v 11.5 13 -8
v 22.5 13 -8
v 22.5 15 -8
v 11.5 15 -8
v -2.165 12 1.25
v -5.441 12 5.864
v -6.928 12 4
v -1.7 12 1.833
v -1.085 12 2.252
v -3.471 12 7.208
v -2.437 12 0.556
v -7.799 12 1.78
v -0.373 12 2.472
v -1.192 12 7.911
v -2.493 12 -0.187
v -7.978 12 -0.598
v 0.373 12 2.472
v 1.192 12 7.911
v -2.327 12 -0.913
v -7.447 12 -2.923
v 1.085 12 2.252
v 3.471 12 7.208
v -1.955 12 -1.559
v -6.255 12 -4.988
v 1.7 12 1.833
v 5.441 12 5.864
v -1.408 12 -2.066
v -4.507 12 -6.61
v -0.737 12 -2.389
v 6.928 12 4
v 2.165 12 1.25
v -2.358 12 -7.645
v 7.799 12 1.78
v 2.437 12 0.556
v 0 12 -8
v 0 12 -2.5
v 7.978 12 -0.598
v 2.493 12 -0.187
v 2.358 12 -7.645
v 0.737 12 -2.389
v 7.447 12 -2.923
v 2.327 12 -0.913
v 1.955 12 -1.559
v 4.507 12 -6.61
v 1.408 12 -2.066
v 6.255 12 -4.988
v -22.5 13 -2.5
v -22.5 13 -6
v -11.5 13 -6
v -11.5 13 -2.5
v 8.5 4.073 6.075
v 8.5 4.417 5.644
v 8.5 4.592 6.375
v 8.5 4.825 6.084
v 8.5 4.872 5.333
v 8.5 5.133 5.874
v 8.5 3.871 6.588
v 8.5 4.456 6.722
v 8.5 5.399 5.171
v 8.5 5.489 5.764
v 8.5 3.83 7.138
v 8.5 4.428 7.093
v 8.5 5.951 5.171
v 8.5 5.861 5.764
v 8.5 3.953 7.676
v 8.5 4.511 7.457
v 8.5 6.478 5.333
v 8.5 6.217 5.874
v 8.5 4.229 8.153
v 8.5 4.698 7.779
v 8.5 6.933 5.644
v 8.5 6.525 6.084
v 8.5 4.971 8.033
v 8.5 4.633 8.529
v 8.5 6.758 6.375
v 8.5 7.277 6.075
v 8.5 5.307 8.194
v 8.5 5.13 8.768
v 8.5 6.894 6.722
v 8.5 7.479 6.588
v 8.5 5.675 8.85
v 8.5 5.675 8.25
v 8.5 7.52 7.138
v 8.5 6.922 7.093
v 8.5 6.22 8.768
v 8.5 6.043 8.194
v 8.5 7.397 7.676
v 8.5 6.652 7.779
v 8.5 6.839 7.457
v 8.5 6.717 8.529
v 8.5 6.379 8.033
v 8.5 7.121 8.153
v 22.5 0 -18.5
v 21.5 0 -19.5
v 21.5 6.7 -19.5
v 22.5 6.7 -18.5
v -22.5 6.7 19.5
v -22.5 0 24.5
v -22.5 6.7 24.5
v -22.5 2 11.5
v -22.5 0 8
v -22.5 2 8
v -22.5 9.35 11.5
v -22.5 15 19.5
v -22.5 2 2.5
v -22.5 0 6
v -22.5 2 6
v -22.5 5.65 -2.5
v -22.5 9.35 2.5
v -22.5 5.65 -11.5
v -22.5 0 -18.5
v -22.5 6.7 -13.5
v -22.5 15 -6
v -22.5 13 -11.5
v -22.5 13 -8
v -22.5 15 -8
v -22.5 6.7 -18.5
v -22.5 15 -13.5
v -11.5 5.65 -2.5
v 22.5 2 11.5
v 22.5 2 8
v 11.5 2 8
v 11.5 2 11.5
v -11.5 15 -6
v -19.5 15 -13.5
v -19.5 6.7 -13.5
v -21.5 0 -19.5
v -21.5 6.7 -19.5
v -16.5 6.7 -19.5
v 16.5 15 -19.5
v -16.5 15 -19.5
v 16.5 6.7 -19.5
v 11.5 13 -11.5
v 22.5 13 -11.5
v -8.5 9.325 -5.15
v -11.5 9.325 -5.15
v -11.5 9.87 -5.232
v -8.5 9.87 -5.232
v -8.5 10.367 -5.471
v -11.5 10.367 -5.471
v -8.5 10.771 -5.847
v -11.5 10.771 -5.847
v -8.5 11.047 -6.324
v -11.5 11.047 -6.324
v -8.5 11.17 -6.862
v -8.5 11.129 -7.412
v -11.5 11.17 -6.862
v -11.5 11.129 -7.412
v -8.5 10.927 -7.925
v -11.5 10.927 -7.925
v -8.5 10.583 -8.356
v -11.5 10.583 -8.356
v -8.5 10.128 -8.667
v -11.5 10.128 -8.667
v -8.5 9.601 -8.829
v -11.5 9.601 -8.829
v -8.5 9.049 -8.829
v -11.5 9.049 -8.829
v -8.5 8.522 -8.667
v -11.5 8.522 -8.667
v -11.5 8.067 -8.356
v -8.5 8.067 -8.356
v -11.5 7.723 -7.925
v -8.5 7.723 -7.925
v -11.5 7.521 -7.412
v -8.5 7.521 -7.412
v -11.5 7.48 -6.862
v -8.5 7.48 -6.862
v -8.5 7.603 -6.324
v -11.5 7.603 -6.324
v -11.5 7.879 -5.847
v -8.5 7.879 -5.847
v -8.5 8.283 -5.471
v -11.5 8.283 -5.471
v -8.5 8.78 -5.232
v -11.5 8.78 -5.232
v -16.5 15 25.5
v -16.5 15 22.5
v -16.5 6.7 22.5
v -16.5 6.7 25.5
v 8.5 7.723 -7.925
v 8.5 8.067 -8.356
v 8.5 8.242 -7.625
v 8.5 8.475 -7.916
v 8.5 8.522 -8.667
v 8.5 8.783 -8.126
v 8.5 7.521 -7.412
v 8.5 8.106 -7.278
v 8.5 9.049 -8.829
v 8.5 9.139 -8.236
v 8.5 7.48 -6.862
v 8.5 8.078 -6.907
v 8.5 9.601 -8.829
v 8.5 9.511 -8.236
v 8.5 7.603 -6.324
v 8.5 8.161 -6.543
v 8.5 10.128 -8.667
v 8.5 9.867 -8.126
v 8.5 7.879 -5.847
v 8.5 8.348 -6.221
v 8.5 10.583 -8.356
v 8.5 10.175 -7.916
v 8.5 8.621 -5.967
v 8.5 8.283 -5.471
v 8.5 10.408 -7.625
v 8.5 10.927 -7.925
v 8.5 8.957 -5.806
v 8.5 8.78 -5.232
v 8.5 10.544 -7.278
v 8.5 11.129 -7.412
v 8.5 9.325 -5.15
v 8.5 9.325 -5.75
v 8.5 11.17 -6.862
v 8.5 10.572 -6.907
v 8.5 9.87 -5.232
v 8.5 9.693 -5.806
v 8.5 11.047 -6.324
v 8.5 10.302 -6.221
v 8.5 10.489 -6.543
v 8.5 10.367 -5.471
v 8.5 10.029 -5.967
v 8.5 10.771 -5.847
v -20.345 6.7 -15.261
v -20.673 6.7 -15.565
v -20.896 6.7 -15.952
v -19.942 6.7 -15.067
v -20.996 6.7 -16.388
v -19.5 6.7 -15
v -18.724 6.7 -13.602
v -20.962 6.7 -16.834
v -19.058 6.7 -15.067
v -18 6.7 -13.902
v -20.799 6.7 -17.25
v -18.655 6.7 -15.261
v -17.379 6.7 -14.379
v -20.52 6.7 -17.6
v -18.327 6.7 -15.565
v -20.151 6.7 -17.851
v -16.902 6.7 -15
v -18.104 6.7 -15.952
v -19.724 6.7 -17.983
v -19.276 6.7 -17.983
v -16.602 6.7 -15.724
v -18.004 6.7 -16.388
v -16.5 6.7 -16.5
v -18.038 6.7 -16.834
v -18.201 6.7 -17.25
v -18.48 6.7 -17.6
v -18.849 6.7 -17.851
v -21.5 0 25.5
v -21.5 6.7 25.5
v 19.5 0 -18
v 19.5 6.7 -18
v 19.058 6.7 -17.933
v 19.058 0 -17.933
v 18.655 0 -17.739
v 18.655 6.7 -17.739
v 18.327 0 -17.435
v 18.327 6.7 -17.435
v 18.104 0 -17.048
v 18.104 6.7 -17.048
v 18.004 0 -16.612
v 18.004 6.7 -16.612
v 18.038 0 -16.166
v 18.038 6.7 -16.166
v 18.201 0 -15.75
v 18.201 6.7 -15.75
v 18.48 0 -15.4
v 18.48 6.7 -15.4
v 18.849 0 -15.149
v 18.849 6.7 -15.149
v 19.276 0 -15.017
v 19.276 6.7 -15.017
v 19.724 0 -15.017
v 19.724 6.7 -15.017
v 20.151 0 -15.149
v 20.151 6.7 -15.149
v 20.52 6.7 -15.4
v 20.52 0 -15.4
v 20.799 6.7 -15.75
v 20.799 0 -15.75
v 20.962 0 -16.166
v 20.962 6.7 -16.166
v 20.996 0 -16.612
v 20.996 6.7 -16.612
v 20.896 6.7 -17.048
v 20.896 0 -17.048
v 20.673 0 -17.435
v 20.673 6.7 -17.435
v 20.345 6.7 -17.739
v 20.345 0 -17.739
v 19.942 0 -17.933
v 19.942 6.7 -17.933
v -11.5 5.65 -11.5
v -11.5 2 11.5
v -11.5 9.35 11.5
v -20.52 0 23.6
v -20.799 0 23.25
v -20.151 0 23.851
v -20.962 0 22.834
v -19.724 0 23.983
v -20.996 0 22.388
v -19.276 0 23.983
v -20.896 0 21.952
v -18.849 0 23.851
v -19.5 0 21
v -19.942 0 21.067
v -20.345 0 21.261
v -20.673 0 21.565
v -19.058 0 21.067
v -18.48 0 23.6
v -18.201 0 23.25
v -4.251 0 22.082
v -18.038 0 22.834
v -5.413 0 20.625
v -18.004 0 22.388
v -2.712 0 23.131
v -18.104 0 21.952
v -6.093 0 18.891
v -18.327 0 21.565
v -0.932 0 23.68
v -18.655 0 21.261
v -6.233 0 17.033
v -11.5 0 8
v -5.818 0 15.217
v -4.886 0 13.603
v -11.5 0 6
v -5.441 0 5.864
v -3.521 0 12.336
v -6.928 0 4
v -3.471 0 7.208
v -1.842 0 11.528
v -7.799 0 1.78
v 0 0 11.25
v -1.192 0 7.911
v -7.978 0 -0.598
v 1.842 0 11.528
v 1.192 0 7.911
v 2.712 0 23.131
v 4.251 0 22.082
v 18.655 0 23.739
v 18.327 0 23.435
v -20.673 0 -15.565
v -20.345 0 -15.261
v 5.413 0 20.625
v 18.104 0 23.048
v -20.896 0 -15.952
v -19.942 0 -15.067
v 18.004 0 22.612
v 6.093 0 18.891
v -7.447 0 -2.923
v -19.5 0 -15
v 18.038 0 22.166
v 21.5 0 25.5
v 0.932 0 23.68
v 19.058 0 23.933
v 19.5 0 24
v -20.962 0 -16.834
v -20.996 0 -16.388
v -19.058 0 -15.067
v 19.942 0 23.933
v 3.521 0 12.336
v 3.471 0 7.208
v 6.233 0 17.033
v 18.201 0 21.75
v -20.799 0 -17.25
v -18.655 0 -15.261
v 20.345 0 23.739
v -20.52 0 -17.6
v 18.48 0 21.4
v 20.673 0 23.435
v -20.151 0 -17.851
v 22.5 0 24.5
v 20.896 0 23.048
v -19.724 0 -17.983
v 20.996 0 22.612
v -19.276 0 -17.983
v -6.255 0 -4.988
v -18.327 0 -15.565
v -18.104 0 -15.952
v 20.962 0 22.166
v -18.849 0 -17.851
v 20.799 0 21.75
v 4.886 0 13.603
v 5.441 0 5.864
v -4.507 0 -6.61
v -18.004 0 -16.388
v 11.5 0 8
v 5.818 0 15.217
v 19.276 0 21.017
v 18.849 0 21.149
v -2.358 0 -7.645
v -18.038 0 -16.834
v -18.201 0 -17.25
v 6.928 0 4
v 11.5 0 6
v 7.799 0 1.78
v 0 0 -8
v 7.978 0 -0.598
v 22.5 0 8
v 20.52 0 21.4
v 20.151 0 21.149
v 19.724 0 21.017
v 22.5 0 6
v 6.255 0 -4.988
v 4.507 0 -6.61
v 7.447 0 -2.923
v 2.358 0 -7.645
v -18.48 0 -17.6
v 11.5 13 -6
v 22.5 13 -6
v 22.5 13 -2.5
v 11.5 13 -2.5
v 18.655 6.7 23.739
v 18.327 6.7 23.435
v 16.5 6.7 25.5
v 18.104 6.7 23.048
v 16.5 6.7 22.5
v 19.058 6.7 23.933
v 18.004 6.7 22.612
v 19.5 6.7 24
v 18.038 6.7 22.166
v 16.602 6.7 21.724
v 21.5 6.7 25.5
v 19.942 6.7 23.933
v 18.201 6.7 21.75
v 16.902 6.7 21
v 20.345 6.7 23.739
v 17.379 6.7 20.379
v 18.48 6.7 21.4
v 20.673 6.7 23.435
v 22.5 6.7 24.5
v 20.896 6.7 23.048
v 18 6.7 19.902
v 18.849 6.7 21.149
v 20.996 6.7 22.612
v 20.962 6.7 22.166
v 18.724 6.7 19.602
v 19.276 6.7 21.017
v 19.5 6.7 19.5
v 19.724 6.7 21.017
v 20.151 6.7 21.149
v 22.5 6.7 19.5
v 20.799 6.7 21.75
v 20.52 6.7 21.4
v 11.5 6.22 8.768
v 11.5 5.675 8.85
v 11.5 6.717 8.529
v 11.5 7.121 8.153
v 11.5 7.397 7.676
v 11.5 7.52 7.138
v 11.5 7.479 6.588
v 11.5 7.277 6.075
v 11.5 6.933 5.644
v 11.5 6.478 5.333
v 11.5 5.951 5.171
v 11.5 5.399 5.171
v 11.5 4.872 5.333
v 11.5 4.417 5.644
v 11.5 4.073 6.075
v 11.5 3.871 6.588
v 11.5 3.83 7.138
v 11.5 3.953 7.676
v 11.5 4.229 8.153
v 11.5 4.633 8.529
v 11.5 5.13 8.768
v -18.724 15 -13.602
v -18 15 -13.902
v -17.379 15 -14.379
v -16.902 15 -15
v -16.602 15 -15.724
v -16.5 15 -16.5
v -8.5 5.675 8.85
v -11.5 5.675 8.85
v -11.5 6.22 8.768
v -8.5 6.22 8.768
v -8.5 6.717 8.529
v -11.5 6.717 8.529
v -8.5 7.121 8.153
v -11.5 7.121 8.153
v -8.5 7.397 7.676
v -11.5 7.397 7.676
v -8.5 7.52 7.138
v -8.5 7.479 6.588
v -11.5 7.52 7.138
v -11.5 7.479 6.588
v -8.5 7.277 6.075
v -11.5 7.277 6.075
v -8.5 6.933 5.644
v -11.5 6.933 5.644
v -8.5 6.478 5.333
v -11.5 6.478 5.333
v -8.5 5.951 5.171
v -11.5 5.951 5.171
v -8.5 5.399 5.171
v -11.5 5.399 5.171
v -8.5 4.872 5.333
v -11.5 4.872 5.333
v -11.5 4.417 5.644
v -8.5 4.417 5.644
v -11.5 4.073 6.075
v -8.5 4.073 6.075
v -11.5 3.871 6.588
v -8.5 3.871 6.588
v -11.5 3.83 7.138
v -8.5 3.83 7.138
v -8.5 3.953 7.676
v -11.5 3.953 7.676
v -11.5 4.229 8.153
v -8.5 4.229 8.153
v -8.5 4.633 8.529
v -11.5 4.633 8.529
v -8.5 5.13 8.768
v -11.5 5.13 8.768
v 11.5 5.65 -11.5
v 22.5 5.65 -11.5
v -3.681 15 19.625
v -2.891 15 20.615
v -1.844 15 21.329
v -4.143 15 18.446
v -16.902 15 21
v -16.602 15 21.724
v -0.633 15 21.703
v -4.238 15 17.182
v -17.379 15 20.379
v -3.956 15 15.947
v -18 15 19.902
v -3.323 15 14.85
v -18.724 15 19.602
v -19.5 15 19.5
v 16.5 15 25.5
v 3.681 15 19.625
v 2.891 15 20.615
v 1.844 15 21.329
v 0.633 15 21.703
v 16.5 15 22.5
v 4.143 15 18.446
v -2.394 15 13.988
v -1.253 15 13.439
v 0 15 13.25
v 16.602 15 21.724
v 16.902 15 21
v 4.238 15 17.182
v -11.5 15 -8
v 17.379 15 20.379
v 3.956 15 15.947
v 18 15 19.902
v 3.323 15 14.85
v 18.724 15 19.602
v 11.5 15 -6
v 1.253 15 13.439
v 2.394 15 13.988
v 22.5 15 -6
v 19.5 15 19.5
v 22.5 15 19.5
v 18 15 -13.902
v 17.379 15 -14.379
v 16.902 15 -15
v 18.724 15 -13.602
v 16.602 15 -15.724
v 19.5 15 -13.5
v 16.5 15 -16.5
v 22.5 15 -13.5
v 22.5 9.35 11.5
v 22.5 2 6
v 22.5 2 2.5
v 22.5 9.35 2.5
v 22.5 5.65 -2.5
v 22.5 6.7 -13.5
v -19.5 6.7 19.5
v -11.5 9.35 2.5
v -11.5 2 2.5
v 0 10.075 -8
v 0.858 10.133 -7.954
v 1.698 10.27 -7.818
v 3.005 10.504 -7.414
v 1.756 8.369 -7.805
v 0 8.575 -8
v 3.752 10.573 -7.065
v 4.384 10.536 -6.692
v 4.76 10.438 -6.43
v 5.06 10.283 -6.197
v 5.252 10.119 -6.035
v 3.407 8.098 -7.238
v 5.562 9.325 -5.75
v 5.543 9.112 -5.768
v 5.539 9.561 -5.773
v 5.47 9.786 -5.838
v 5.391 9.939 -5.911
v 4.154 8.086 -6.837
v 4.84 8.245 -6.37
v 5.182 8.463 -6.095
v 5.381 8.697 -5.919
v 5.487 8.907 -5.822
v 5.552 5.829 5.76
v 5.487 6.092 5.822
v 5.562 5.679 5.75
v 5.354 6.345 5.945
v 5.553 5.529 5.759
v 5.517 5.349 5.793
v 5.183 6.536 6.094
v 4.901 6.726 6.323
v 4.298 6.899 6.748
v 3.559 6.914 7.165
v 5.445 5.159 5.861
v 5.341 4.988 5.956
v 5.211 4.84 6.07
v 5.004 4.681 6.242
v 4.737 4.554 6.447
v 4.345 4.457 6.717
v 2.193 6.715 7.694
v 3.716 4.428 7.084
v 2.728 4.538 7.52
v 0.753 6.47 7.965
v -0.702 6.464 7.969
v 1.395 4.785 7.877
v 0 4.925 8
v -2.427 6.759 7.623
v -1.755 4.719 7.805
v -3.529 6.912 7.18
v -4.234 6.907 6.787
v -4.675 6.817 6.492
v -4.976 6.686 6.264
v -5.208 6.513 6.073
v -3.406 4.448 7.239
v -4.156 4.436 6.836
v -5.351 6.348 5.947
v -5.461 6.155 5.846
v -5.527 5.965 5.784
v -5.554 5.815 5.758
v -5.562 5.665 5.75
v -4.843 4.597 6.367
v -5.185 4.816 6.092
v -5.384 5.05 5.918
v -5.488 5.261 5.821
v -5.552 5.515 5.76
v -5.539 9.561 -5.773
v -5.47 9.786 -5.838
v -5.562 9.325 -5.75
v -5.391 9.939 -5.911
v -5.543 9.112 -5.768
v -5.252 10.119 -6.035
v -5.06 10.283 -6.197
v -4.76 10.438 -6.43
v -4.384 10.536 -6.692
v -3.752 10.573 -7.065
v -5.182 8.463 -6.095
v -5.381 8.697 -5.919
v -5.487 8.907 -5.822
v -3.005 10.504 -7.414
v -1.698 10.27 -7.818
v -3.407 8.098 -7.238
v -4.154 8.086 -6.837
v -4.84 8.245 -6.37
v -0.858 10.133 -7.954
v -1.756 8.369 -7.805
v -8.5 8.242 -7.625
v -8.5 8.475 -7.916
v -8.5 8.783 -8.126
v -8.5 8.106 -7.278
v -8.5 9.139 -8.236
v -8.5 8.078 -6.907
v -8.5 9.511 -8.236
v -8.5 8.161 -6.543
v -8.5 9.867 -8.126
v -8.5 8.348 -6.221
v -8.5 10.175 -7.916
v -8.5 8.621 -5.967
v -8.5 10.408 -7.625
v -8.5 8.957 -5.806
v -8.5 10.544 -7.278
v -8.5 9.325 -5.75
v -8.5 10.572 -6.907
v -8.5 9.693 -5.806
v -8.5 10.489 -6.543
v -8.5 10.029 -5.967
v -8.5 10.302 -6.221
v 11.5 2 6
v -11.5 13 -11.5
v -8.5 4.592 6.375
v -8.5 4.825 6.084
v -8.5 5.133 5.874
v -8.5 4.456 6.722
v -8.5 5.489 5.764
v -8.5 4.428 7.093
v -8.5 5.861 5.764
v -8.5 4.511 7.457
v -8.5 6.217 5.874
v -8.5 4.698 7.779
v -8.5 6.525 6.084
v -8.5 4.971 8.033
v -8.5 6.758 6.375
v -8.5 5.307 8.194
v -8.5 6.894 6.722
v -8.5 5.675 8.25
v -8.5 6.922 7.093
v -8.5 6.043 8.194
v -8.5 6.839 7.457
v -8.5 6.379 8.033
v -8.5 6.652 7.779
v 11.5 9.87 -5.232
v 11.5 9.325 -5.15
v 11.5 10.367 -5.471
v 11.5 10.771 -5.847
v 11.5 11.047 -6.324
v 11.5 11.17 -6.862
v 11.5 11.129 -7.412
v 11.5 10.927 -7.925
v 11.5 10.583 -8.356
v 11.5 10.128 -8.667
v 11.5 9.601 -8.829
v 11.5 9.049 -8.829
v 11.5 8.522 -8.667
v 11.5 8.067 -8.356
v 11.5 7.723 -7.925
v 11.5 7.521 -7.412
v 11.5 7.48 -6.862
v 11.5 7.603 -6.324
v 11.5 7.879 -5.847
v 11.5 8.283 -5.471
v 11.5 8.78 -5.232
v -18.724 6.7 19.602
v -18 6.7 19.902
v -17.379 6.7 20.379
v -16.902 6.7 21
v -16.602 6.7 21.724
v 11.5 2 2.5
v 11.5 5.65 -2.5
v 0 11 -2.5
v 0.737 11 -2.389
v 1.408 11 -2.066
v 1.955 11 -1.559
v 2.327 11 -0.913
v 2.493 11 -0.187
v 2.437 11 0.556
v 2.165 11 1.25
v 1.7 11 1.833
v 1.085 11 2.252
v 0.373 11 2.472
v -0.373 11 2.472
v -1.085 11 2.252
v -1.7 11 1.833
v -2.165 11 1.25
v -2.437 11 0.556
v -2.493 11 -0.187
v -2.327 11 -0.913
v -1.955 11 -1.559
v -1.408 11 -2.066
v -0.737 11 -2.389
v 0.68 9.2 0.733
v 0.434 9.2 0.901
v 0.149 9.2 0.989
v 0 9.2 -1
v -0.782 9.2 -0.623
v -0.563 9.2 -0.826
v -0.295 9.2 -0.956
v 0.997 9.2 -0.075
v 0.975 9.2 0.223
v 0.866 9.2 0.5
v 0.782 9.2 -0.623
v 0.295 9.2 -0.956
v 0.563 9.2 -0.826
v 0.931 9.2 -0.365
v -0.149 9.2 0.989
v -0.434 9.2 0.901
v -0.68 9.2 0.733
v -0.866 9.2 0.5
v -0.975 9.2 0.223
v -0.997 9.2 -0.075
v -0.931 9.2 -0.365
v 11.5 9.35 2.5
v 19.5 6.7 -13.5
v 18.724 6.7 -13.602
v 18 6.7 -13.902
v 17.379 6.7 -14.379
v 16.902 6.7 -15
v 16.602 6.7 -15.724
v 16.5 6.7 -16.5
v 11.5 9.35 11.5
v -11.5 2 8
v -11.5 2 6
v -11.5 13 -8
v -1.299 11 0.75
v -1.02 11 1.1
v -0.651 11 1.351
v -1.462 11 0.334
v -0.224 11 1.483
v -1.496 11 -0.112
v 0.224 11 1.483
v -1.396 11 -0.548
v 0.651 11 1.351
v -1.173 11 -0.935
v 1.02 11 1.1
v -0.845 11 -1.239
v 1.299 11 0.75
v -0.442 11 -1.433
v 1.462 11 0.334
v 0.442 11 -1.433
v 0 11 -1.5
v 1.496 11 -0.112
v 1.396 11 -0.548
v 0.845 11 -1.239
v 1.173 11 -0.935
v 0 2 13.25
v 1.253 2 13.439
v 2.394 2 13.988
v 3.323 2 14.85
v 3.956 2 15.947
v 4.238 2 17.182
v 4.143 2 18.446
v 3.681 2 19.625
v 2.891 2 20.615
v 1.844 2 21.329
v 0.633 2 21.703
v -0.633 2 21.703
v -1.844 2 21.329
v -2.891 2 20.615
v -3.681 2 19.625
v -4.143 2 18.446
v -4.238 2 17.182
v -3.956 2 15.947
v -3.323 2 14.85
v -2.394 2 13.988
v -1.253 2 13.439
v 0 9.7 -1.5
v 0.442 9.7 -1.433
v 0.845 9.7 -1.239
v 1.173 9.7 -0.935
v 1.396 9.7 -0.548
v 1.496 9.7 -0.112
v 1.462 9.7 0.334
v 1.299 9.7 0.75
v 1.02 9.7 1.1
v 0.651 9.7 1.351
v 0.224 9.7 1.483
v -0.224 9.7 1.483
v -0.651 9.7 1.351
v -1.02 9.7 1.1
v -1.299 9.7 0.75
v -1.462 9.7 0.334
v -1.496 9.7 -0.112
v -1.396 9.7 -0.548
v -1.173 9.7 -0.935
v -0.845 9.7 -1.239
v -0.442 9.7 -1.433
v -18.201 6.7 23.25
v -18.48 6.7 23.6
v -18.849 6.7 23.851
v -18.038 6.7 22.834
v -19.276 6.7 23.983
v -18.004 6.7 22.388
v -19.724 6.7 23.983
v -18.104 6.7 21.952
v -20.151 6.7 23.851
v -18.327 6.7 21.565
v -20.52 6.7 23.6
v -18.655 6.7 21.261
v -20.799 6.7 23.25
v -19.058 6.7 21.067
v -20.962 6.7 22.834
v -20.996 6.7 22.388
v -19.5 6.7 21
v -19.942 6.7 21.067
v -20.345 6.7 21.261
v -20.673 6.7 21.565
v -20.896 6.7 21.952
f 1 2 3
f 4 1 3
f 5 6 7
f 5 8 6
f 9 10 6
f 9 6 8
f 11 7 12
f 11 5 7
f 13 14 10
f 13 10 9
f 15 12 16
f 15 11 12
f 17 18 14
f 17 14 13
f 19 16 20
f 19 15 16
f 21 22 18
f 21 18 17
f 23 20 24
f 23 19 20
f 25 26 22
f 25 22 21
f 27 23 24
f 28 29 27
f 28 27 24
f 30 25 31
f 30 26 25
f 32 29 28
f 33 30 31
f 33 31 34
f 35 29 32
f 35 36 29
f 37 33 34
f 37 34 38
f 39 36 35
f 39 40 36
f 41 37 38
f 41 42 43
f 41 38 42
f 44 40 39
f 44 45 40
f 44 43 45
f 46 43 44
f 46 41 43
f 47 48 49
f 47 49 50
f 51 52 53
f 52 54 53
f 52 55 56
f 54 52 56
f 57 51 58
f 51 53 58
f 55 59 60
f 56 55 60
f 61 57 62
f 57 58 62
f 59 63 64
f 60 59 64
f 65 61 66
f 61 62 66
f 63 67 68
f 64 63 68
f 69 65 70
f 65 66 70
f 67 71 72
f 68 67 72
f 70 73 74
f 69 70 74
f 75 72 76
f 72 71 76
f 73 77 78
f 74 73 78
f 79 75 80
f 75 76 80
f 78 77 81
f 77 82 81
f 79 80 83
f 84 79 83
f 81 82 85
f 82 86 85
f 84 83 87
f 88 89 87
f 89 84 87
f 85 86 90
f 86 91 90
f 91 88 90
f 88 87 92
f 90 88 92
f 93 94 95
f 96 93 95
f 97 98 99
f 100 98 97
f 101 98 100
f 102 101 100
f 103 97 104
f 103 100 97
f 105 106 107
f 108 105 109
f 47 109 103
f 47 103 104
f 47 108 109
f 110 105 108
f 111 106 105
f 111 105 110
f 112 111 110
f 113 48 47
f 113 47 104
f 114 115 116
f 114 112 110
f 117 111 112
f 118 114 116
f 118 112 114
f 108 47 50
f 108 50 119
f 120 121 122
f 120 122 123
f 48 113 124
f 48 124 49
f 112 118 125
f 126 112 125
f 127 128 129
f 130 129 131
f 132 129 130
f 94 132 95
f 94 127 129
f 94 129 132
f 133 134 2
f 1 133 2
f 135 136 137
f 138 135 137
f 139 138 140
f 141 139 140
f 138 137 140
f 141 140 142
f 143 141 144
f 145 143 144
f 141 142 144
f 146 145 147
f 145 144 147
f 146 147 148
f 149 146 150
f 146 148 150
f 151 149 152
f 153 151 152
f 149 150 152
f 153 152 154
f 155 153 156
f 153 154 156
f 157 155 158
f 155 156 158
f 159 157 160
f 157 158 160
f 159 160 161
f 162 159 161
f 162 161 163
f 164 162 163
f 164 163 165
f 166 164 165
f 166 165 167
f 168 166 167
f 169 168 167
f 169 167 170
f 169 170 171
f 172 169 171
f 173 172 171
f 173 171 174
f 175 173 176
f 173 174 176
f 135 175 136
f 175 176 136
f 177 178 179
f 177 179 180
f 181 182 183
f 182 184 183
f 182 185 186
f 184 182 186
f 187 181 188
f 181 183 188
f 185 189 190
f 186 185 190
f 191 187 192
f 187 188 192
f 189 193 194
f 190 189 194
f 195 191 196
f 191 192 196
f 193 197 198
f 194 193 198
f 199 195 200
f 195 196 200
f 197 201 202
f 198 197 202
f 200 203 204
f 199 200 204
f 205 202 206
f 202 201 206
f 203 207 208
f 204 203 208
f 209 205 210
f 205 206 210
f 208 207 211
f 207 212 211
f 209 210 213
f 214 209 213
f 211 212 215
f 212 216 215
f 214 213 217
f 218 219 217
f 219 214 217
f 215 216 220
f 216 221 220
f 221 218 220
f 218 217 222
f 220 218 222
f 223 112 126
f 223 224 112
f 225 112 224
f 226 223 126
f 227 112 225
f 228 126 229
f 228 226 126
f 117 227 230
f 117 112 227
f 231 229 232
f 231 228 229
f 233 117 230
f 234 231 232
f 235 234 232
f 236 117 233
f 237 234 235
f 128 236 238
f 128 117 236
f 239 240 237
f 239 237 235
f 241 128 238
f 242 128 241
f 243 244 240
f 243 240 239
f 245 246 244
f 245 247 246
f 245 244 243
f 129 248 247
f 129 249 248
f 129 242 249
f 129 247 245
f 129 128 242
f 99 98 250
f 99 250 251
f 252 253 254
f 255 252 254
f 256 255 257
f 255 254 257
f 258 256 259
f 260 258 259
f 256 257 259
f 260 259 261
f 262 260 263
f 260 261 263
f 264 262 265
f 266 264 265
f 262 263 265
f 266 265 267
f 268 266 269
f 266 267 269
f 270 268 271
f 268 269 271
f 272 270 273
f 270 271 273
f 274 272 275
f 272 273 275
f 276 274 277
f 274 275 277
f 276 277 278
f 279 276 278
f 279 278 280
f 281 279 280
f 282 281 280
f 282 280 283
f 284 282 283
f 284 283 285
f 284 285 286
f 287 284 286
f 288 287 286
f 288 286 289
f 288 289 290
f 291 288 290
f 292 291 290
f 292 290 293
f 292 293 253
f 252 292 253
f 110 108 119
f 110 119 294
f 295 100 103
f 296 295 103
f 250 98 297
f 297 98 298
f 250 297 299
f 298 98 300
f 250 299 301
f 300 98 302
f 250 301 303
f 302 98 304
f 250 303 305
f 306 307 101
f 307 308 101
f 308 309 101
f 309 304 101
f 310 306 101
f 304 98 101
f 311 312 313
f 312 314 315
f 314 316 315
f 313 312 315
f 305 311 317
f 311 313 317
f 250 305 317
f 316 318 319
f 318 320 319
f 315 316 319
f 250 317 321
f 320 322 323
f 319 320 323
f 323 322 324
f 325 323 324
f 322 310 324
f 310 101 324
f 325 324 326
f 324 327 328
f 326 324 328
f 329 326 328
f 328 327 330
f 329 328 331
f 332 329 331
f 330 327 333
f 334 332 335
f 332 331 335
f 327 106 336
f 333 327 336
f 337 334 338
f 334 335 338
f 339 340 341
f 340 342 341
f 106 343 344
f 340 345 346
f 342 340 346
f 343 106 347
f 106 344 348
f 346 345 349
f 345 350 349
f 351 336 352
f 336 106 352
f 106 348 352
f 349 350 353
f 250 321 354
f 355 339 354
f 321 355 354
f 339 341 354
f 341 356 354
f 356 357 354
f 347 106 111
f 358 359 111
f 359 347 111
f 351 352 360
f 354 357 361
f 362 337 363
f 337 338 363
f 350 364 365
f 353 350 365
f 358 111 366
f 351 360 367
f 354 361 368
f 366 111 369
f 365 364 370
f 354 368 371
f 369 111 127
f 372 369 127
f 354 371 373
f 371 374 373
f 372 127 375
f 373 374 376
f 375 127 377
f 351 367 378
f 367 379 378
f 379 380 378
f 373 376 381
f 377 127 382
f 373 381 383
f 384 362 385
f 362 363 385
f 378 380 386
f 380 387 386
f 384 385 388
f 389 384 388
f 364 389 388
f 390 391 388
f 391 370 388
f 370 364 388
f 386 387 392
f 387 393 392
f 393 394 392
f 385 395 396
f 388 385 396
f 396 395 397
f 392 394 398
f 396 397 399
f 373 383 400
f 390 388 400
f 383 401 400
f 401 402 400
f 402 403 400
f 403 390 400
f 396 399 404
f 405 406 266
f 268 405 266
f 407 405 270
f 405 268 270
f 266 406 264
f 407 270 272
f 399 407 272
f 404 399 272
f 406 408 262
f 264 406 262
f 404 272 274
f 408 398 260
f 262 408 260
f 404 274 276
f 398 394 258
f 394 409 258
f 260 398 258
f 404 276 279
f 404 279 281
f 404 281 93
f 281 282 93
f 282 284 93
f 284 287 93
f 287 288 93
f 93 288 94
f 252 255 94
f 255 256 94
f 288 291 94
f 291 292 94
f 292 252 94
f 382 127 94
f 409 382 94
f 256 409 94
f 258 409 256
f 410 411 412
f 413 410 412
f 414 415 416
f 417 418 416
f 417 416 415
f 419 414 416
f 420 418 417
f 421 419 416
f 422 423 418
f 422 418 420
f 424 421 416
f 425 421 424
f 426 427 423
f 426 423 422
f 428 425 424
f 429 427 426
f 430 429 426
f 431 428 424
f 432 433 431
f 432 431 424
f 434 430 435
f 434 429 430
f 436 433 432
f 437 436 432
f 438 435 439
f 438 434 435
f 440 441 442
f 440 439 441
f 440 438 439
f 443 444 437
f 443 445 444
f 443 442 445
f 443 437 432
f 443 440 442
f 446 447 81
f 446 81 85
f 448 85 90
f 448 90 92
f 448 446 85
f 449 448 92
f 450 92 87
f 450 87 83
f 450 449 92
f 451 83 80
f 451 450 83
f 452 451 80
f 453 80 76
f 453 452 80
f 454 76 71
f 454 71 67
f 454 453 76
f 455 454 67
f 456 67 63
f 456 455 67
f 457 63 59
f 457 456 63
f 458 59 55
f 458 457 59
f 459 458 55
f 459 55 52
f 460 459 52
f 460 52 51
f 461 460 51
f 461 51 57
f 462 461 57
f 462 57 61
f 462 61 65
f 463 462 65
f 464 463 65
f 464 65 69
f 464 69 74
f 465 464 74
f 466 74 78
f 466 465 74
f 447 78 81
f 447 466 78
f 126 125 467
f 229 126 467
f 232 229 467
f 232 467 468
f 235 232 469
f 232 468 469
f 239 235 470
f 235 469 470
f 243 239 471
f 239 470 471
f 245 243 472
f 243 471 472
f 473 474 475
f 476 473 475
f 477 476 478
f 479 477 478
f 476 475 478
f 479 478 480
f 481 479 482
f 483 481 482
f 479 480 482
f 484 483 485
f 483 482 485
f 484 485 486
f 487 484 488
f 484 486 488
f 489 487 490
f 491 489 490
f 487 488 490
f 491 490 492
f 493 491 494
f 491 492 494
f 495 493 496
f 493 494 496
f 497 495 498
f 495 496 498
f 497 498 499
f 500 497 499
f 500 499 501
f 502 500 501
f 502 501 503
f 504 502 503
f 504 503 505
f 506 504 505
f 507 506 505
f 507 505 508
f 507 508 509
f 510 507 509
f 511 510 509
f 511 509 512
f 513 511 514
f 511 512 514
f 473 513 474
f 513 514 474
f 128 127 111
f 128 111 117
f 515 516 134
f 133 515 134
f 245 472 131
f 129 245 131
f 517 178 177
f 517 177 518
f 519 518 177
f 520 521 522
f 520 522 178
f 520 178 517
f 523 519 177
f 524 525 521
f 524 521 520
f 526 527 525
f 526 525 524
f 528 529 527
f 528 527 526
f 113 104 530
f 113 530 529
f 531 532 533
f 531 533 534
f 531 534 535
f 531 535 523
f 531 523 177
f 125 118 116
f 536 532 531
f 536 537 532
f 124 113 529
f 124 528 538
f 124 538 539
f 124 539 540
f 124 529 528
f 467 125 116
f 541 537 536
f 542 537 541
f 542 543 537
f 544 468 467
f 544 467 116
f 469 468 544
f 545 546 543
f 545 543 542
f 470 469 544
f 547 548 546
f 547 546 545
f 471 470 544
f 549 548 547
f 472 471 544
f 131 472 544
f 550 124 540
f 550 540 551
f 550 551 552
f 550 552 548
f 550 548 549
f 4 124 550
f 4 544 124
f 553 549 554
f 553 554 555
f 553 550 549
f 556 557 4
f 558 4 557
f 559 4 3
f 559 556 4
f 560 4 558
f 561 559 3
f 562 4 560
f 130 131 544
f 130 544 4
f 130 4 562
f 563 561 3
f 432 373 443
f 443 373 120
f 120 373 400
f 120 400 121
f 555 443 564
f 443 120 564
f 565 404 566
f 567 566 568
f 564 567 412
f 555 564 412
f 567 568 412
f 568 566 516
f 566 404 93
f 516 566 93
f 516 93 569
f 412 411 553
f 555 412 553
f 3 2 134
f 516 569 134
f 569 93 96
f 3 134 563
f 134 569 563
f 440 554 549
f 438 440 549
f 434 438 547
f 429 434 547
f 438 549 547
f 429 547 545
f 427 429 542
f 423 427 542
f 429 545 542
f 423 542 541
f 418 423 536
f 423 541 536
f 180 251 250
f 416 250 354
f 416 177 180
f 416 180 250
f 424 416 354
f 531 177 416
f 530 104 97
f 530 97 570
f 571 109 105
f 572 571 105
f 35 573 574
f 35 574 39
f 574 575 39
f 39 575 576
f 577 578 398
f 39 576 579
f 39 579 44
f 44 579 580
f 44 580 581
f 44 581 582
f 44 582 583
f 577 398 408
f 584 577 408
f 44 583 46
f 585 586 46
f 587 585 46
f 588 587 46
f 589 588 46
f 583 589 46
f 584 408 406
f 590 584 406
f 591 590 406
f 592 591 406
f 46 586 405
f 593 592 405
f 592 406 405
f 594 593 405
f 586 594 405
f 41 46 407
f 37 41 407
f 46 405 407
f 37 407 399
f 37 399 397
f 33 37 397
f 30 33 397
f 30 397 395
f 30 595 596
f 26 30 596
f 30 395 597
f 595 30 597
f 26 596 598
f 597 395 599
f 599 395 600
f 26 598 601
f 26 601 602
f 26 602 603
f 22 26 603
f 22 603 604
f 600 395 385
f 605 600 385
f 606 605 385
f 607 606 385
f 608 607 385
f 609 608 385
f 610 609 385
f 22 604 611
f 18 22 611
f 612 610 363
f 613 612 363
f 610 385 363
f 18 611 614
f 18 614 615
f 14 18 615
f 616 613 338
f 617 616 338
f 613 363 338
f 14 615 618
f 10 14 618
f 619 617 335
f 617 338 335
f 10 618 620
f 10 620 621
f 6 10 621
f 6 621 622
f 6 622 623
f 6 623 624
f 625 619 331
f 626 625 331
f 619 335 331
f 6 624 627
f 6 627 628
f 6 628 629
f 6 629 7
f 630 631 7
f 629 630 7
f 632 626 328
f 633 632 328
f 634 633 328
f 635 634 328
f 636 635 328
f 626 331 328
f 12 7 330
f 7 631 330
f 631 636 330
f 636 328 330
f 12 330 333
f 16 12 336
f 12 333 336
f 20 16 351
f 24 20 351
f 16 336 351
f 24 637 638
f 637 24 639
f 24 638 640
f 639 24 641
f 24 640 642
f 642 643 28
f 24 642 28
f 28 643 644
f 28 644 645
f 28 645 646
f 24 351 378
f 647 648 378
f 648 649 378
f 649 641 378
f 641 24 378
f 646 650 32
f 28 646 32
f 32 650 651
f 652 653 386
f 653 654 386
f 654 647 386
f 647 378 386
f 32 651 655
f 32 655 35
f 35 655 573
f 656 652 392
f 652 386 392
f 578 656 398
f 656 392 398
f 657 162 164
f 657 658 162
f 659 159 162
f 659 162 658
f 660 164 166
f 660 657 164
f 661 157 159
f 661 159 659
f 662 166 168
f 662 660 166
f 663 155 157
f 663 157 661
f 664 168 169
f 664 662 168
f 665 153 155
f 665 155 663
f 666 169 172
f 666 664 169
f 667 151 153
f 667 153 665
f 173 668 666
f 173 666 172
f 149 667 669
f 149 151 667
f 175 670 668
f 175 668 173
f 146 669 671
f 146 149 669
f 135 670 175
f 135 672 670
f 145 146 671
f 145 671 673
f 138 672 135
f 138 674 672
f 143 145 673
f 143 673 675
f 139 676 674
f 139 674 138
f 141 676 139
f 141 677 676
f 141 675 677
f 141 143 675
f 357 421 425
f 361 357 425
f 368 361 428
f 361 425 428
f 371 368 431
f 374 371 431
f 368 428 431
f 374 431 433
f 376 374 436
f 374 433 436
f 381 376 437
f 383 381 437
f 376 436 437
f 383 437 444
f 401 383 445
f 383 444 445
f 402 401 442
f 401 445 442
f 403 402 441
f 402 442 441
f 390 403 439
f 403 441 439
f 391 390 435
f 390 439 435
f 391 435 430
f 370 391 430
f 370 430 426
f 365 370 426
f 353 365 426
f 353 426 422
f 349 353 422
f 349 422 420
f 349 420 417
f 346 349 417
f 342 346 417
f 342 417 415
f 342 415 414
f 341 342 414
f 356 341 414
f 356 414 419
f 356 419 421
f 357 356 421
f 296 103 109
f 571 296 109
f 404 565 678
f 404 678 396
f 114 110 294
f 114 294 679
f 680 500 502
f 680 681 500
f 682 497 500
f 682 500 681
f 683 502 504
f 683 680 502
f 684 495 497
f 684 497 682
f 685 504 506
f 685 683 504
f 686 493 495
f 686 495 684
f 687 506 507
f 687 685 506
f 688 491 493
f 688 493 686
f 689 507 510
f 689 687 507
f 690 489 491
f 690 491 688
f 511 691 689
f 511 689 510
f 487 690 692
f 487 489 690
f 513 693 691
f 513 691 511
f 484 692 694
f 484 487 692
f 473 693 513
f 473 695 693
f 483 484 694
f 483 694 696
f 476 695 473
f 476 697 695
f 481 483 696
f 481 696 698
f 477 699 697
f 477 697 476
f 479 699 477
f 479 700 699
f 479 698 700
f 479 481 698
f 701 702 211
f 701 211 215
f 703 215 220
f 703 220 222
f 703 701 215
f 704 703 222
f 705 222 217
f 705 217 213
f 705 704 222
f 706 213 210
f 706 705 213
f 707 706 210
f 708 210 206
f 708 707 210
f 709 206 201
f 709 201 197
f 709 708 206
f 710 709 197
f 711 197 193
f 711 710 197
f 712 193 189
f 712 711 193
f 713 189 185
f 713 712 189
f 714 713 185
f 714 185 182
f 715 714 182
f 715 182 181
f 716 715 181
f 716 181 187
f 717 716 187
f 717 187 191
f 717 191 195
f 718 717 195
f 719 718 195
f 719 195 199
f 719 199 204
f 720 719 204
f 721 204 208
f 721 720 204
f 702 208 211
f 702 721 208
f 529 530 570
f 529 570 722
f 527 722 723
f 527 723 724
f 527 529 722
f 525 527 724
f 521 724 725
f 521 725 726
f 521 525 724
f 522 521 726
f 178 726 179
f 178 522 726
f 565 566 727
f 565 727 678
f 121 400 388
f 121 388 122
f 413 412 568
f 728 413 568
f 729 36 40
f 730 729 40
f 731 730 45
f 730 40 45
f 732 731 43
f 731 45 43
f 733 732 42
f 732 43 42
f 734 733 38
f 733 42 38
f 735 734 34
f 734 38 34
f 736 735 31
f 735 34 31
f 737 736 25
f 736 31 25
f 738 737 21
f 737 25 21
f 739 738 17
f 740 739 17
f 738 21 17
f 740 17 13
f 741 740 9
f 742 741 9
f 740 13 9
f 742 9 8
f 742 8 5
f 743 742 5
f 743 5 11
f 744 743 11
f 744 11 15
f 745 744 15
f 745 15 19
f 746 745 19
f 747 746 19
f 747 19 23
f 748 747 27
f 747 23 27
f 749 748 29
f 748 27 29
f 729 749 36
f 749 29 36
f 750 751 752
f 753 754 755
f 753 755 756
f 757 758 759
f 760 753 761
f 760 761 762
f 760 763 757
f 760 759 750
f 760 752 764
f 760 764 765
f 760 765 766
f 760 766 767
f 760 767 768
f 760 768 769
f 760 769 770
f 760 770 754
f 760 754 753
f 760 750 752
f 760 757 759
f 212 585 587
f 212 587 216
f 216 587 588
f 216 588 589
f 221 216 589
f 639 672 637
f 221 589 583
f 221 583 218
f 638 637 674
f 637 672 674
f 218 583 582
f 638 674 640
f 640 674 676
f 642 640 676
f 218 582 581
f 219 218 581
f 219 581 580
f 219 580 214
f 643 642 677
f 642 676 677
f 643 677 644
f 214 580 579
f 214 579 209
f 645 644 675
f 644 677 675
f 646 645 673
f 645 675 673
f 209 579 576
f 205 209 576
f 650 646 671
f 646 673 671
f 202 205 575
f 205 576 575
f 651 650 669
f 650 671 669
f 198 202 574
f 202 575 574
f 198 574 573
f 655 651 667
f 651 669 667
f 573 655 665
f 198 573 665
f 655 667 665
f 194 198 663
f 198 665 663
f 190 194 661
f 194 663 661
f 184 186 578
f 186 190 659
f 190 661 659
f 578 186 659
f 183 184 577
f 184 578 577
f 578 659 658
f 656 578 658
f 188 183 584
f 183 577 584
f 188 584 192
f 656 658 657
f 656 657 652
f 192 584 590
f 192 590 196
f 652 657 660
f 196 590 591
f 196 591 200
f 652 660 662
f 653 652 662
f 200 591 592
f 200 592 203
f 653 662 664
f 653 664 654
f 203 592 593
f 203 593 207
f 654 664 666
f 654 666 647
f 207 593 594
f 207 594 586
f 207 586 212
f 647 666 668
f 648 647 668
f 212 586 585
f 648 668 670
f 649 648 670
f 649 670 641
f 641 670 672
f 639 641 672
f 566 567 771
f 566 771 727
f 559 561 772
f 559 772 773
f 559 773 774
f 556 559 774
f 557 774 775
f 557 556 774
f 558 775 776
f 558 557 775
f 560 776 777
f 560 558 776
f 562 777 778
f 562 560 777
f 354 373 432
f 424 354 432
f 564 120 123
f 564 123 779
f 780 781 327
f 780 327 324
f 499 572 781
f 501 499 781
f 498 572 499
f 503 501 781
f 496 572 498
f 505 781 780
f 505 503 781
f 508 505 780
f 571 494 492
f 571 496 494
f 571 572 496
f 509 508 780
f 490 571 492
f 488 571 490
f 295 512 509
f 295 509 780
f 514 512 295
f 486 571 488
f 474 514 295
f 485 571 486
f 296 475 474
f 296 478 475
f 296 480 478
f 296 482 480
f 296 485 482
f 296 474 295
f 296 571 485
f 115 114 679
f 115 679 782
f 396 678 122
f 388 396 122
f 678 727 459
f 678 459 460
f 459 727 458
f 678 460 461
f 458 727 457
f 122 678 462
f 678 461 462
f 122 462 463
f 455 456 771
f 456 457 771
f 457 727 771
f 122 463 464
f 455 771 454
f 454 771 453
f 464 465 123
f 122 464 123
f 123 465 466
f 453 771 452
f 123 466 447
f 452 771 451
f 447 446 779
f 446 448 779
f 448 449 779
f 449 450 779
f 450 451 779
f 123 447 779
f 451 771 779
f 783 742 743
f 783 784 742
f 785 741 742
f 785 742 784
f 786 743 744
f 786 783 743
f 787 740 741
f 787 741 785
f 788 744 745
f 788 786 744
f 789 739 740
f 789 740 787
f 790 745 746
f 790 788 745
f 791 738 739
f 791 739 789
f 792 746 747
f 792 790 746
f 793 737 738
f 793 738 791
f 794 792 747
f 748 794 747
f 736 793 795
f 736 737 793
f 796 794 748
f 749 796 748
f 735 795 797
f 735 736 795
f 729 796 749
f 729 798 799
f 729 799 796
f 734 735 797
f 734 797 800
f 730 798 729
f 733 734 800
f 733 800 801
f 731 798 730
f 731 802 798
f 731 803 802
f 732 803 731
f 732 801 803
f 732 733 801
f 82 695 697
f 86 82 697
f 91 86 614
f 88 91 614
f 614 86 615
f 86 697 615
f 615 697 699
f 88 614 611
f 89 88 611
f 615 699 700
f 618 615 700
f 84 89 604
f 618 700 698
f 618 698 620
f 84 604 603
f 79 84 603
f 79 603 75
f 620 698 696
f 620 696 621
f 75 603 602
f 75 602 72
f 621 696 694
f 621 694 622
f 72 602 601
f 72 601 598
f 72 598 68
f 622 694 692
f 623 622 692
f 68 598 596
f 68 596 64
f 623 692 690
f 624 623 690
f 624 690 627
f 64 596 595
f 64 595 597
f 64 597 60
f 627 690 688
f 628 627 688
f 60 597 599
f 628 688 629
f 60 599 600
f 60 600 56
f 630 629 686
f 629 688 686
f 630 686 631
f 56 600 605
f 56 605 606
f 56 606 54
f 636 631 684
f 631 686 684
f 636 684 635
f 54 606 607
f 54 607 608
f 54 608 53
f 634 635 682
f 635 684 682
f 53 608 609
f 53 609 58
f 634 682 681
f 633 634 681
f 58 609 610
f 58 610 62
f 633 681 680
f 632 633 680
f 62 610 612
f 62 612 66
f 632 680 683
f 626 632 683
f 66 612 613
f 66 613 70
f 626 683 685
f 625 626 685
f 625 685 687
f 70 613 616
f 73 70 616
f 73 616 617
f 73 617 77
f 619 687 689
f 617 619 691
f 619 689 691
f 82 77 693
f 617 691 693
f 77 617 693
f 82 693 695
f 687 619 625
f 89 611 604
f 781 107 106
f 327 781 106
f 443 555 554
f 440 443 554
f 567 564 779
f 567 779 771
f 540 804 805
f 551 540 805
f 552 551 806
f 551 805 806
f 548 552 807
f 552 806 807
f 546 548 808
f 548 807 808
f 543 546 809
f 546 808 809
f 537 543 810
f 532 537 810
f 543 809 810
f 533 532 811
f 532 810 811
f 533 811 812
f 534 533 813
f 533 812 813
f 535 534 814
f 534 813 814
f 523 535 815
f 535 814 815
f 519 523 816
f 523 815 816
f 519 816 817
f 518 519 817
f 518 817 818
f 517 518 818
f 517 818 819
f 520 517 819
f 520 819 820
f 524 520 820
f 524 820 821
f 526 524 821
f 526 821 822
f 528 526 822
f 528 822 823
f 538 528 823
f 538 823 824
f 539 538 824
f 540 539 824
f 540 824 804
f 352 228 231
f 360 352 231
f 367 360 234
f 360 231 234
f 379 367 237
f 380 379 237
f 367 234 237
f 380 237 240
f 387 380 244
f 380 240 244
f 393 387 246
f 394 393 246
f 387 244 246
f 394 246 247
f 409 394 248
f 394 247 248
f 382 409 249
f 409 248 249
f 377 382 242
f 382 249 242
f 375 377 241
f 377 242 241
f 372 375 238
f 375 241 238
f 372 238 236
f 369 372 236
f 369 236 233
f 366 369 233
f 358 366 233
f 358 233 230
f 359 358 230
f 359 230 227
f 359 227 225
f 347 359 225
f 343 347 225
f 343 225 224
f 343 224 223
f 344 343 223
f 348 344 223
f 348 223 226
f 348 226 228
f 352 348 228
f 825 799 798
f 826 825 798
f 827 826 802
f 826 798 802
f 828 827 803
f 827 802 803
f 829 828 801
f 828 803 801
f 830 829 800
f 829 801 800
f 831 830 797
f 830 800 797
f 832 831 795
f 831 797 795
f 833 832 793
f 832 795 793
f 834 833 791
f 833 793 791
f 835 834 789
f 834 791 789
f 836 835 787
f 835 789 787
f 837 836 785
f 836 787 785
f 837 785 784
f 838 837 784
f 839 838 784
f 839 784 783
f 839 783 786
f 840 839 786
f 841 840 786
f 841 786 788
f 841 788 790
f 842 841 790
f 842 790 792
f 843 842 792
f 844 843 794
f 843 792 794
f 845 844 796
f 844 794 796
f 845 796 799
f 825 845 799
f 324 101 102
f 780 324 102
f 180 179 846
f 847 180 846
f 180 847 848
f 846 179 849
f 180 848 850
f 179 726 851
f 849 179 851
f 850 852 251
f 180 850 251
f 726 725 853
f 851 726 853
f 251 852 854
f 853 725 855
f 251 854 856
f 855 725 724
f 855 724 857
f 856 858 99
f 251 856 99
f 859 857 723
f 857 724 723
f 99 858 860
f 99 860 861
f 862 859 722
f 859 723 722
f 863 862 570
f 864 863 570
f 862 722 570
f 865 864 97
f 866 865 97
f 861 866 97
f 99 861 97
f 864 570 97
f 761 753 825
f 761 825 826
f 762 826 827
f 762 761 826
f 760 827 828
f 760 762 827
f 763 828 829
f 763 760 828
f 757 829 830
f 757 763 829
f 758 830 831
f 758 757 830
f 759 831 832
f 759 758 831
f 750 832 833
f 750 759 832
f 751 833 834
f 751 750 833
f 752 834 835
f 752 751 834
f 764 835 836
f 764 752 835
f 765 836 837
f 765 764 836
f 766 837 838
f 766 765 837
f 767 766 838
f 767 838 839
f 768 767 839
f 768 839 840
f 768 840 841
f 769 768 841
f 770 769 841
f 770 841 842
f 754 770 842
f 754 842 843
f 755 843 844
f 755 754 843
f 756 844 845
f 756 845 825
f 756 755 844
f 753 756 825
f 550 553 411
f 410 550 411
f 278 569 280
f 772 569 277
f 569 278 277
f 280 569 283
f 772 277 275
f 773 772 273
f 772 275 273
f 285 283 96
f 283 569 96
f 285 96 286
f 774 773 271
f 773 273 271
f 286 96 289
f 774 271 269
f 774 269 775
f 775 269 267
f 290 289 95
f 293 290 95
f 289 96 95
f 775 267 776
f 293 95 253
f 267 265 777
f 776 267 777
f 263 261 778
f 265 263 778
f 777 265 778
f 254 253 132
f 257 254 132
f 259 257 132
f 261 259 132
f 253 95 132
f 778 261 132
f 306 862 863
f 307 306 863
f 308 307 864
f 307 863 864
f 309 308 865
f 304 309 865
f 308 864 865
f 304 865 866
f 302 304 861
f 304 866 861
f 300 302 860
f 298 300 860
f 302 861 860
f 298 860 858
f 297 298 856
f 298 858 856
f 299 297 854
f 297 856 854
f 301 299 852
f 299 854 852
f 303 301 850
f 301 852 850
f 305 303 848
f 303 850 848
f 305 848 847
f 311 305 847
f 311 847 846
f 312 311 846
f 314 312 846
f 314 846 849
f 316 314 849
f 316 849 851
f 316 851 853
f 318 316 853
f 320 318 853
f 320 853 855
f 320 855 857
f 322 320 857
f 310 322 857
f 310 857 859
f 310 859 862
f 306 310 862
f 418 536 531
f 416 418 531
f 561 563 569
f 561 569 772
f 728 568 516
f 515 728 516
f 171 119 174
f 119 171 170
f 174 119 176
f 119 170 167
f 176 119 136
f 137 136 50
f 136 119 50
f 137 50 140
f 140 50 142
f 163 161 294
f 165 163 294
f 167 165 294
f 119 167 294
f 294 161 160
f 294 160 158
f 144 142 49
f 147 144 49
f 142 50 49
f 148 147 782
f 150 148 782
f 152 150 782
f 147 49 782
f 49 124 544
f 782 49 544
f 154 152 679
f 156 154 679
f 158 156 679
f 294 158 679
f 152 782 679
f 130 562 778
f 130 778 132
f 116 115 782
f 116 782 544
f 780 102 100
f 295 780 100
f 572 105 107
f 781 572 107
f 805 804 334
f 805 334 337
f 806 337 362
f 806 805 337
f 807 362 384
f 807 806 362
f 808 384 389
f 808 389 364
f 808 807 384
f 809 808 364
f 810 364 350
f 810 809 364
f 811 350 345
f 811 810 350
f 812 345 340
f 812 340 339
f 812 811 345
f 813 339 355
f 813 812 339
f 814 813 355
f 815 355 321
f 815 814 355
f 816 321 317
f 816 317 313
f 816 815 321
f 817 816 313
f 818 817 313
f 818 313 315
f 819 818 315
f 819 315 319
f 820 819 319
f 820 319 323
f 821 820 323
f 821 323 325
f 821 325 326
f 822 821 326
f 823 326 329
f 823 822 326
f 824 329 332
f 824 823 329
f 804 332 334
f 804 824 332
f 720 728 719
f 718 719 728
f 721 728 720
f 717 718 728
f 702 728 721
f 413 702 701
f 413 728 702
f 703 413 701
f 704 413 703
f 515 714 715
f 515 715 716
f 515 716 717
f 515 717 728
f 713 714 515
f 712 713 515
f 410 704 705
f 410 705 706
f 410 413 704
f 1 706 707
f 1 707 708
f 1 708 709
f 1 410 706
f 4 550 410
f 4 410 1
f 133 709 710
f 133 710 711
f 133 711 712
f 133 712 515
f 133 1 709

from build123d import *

# Parameters (mm, degrees)
SKETCH_1_W          = 45
SKETCH_1_H          = 39
EXTRUDE_1_DEPTH     = 15
CUT_EXTRUDE_1_DEPTH = 11
SKETCH_3_R          = 1.85
CUT_EXTRUDE_2_DEPTH = 3
SKETCH_4_R          = 1.25
CUT_EXTRUDE_3_DEPTH = 40.575876491
SKETCH_5_R          = 8
CUT_EXTRUDE_4_DEPTH = 12
SKETCH_6_R          = 2.5
EXTRUDE_2_DEPTH     = 1
SKETCH_7_R          = 1.5
EXTRUDE_3_DEPTH     = 1.8
SKETCH_8_W          = 45
SKETCH_8_H          = 15
EXTRUDE_4_DEPTH     = 6
SKETCH_10_R         = 1.5
CUT_EXTRUDE_5_DEPTH = 38.16853512
CUT_EXTRUDE_6_DEPTH = 8.3
SKETCH_12_R         = 4.25
CUT_EXTRUDE_7_DEPTH = 38.16853508
CHAMFER_4_SIZE      = 2
CHAMFER_2_SIZE      = 0.5
CHAMFER_3_SIZE      = 1


with BuildPart() as part:
    # 草图1 → 凸台-拉伸1 (new body)
    with BuildSketch(Plane(origin=(0, 0, 0), x_dir=(1, 0, 0), z_dir=(0, 1, 0))):
        Rectangle(SKETCH_1_W, SKETCH_1_H)
    extrude(amount=EXTRUDE_1_DEPTH)

    # 草图2 → 切除-拉伸1 (cut)
    with BuildSketch(Plane.ZY.offset(22.5)):
        Polygon((-8, 13), (-8, 15), (-6, 15), (-6, 13), (-2.5, 13), (-2.5, 5.65), (-11.5, 5.65), (-11.5, 13), align=None)
        Polygon((6, 2), (6, 0), (8, 0), (8, 2), (11.5, 2), (11.5, 9.35), (2.5, 9.35), (2.5, 2), align=None)
    cut_extrude_1 = extrude(amount=-CUT_EXTRUDE_1_DEPTH, mode=Mode.SUBTRACT)

    # 草图3 → 切除-拉伸2 (cut)
    with BuildSketch(Plane.ZY.offset(11.5)):
        with Locations((-7, 9.325)):
            Circle(SKETCH_3_R)
        with Locations((7, 5.675)):
            Circle(SKETCH_3_R)
    cut_extrude_2 = extrude(amount=-CUT_EXTRUDE_2_DEPTH, mode=Mode.SUBTRACT)

    # 草图4 → 切除-拉伸3 (cut, through all)
    with BuildSketch(Plane.ZY.offset(8.5)):
        with Locations((-7, 9.325)):
            Circle(SKETCH_4_R)
        with Locations((7, 5.675)):
            Circle(SKETCH_4_R)
    extrude(amount=-CUT_EXTRUDE_3_DEPTH, mode=Mode.SUBTRACT)

    # 镜向1: 切除-拉伸1, 切除-拉伸2 across plane
    add(cut_extrude_1.mirror(Plane(origin=(0, 0, 0), x_dir=(0, 0, 1), z_dir=(1, 0, 0))), mode=Mode.SUBTRACT)
    add(cut_extrude_2.mirror(Plane(origin=(0, 0, 0), x_dir=(0, 0, 1), z_dir=(1, 0, 0))), mode=Mode.SUBTRACT)

    # 草图5 → 切除-拉伸4 (cut)
    with BuildSketch(Plane.XZ):
        with Locations(Location((0, 0, 0), (0, 0, 270))):
            Circle(SKETCH_5_R)
    extrude(amount=-CUT_EXTRUDE_4_DEPTH, mode=Mode.SUBTRACT)

    # 草图6 → 凸台-拉伸2 (add)
    with BuildSketch(Plane.XZ.offset(-12)):
        with Locations(Location((0, 0, 0), (0, 0, 270))):
            Circle(SKETCH_6_R)
    extrude(amount=EXTRUDE_2_DEPTH)

    # 草图7 → 凸台-拉伸3 (add)
    with BuildSketch(Plane.XZ.offset(-11)):
        with Locations(Location((0, 0, 0), (0, 0, 270))):
            Circle(SKETCH_7_R)
    extrude(amount=EXTRUDE_3_DEPTH)

    # 草图8 → 凸台-拉伸4 (add)
    with BuildSketch(Plane.XY.offset(19.5)):
        with Locations((0, 7.5)):
            Rectangle(SKETCH_8_W, SKETCH_8_H)
    extrude(amount=EXTRUDE_4_DEPTH)

    # 草图10 → 切除-拉伸5 (cut, through all)
    with BuildSketch(Plane(origin=(0, 15, 0), x_dir=(1, 0, 0), z_dir=(0, 1, 0))):
        with Locations(Location((-19.5, 16.5, 0), (0, 0, 270))):
            Circle(SKETCH_10_R)
        with Locations(Location((19.5, 16.5, 0), (0, 0, 90))):
            Circle(SKETCH_10_R)
        with Locations(Location((19.5, -22.5, 0), (0, 0, 270))):
            Circle(SKETCH_10_R)
        with Locations(Location((-19.5, -22.5, 0), (0, 0, 90))):
            Circle(SKETCH_10_R)
    extrude(amount=-CUT_EXTRUDE_5_DEPTH, mode=Mode.SUBTRACT)

    # 草图11 → 切除-拉伸6 (cut)
    with BuildSketch(Plane(origin=(0, 15, 0), x_dir=(1, 0, 0), z_dir=(0, 1, 0))):
        with BuildLine():
            Line((-16.5, 16.5), (-16.5, 19.5))
            Line((-16.5, 19.5), (-22.5, 19.5))
            Line((-22.5, 19.5), (-22.5, 13.5))
            Line((-22.5, 13.5), (-19.5, 13.5))
            ThreePointArc((-19.5, 13.5), (-17.378679656, 14.378679656), (-16.5, 16.5))
        make_face()
        with BuildLine():
            Line((22.5, 19.5), (22.5, 13.5))
            Line((22.5, 13.5), (19.5, 13.5))
            ThreePointArc((19.5, 13.5), (17.378679656, 14.378679656), (16.5, 16.5))
            Line((16.5, 16.5), (16.5, 19.5))
            Line((16.5, 19.5), (22.5, 19.5))
        make_face()
        with BuildLine():
            Line((16.5, -25.5), (22.5, -25.5))
            Line((22.5, -25.5), (22.5, -19.5))
            Line((22.5, -19.5), (19.5, -19.5))
            ThreePointArc((19.5, -19.5), (17.378679656, -20.378679656), (16.5, -22.5))
            Line((16.5, -22.5), (16.5, -25.5))
        make_face()
        with BuildLine():
            Line((-22.5, -25.5), (-22.5, -19.5))
            Line((-22.5, -19.5), (-19.5, -19.5))
            ThreePointArc((-19.5, -19.5), (-17.378679656, -20.378679656), (-16.5, -22.5))
            Line((-16.5, -22.5), (-16.5, -25.5))
            Line((-16.5, -25.5), (-22.5, -25.5))
        make_face()
    extrude(amount=-CUT_EXTRUDE_6_DEPTH, mode=Mode.SUBTRACT)

    # 草图12 → 切除-拉伸7 (cut, through all)
    with BuildSketch(Plane.XZ):
        with Locations(Location((0, 17.5, 0), (0, 0, 270))):
            Circle(SKETCH_12_R)
    extrude(amount=-CUT_EXTRUDE_7_DEPTH, mode=Mode.SUBTRACT)

    # 倒角4
    chamfer_4_edges = [part.edges().sort_by_distance(p)[0] for p in [
        (0, 0, 21.75),
    ]]
    chamfer(chamfer_4_edges, length=CHAMFER_4_SIZE)

    # 倒角2
    chamfer_2_edges = [part.edges().sort_by_distance(p)[0] for p in [
        (0, 9.2, 1.5),
    ]]
    chamfer(chamfer_2_edges, length=CHAMFER_2_SIZE)

    # 倒角3
    chamfer_3_edges = [part.edges().sort_by_distance(p)[0] for p in [
        (22.5, 3.35, 25.5),
        (-22.5, 3.35, 25.5),
        (-22.5, 3.35, -19.5),
        (22.5, 3.35, -19.5),
    ]]
    chamfer(chamfer_3_edges, length=CHAMFER_3_SIZE)


solid = part.part
